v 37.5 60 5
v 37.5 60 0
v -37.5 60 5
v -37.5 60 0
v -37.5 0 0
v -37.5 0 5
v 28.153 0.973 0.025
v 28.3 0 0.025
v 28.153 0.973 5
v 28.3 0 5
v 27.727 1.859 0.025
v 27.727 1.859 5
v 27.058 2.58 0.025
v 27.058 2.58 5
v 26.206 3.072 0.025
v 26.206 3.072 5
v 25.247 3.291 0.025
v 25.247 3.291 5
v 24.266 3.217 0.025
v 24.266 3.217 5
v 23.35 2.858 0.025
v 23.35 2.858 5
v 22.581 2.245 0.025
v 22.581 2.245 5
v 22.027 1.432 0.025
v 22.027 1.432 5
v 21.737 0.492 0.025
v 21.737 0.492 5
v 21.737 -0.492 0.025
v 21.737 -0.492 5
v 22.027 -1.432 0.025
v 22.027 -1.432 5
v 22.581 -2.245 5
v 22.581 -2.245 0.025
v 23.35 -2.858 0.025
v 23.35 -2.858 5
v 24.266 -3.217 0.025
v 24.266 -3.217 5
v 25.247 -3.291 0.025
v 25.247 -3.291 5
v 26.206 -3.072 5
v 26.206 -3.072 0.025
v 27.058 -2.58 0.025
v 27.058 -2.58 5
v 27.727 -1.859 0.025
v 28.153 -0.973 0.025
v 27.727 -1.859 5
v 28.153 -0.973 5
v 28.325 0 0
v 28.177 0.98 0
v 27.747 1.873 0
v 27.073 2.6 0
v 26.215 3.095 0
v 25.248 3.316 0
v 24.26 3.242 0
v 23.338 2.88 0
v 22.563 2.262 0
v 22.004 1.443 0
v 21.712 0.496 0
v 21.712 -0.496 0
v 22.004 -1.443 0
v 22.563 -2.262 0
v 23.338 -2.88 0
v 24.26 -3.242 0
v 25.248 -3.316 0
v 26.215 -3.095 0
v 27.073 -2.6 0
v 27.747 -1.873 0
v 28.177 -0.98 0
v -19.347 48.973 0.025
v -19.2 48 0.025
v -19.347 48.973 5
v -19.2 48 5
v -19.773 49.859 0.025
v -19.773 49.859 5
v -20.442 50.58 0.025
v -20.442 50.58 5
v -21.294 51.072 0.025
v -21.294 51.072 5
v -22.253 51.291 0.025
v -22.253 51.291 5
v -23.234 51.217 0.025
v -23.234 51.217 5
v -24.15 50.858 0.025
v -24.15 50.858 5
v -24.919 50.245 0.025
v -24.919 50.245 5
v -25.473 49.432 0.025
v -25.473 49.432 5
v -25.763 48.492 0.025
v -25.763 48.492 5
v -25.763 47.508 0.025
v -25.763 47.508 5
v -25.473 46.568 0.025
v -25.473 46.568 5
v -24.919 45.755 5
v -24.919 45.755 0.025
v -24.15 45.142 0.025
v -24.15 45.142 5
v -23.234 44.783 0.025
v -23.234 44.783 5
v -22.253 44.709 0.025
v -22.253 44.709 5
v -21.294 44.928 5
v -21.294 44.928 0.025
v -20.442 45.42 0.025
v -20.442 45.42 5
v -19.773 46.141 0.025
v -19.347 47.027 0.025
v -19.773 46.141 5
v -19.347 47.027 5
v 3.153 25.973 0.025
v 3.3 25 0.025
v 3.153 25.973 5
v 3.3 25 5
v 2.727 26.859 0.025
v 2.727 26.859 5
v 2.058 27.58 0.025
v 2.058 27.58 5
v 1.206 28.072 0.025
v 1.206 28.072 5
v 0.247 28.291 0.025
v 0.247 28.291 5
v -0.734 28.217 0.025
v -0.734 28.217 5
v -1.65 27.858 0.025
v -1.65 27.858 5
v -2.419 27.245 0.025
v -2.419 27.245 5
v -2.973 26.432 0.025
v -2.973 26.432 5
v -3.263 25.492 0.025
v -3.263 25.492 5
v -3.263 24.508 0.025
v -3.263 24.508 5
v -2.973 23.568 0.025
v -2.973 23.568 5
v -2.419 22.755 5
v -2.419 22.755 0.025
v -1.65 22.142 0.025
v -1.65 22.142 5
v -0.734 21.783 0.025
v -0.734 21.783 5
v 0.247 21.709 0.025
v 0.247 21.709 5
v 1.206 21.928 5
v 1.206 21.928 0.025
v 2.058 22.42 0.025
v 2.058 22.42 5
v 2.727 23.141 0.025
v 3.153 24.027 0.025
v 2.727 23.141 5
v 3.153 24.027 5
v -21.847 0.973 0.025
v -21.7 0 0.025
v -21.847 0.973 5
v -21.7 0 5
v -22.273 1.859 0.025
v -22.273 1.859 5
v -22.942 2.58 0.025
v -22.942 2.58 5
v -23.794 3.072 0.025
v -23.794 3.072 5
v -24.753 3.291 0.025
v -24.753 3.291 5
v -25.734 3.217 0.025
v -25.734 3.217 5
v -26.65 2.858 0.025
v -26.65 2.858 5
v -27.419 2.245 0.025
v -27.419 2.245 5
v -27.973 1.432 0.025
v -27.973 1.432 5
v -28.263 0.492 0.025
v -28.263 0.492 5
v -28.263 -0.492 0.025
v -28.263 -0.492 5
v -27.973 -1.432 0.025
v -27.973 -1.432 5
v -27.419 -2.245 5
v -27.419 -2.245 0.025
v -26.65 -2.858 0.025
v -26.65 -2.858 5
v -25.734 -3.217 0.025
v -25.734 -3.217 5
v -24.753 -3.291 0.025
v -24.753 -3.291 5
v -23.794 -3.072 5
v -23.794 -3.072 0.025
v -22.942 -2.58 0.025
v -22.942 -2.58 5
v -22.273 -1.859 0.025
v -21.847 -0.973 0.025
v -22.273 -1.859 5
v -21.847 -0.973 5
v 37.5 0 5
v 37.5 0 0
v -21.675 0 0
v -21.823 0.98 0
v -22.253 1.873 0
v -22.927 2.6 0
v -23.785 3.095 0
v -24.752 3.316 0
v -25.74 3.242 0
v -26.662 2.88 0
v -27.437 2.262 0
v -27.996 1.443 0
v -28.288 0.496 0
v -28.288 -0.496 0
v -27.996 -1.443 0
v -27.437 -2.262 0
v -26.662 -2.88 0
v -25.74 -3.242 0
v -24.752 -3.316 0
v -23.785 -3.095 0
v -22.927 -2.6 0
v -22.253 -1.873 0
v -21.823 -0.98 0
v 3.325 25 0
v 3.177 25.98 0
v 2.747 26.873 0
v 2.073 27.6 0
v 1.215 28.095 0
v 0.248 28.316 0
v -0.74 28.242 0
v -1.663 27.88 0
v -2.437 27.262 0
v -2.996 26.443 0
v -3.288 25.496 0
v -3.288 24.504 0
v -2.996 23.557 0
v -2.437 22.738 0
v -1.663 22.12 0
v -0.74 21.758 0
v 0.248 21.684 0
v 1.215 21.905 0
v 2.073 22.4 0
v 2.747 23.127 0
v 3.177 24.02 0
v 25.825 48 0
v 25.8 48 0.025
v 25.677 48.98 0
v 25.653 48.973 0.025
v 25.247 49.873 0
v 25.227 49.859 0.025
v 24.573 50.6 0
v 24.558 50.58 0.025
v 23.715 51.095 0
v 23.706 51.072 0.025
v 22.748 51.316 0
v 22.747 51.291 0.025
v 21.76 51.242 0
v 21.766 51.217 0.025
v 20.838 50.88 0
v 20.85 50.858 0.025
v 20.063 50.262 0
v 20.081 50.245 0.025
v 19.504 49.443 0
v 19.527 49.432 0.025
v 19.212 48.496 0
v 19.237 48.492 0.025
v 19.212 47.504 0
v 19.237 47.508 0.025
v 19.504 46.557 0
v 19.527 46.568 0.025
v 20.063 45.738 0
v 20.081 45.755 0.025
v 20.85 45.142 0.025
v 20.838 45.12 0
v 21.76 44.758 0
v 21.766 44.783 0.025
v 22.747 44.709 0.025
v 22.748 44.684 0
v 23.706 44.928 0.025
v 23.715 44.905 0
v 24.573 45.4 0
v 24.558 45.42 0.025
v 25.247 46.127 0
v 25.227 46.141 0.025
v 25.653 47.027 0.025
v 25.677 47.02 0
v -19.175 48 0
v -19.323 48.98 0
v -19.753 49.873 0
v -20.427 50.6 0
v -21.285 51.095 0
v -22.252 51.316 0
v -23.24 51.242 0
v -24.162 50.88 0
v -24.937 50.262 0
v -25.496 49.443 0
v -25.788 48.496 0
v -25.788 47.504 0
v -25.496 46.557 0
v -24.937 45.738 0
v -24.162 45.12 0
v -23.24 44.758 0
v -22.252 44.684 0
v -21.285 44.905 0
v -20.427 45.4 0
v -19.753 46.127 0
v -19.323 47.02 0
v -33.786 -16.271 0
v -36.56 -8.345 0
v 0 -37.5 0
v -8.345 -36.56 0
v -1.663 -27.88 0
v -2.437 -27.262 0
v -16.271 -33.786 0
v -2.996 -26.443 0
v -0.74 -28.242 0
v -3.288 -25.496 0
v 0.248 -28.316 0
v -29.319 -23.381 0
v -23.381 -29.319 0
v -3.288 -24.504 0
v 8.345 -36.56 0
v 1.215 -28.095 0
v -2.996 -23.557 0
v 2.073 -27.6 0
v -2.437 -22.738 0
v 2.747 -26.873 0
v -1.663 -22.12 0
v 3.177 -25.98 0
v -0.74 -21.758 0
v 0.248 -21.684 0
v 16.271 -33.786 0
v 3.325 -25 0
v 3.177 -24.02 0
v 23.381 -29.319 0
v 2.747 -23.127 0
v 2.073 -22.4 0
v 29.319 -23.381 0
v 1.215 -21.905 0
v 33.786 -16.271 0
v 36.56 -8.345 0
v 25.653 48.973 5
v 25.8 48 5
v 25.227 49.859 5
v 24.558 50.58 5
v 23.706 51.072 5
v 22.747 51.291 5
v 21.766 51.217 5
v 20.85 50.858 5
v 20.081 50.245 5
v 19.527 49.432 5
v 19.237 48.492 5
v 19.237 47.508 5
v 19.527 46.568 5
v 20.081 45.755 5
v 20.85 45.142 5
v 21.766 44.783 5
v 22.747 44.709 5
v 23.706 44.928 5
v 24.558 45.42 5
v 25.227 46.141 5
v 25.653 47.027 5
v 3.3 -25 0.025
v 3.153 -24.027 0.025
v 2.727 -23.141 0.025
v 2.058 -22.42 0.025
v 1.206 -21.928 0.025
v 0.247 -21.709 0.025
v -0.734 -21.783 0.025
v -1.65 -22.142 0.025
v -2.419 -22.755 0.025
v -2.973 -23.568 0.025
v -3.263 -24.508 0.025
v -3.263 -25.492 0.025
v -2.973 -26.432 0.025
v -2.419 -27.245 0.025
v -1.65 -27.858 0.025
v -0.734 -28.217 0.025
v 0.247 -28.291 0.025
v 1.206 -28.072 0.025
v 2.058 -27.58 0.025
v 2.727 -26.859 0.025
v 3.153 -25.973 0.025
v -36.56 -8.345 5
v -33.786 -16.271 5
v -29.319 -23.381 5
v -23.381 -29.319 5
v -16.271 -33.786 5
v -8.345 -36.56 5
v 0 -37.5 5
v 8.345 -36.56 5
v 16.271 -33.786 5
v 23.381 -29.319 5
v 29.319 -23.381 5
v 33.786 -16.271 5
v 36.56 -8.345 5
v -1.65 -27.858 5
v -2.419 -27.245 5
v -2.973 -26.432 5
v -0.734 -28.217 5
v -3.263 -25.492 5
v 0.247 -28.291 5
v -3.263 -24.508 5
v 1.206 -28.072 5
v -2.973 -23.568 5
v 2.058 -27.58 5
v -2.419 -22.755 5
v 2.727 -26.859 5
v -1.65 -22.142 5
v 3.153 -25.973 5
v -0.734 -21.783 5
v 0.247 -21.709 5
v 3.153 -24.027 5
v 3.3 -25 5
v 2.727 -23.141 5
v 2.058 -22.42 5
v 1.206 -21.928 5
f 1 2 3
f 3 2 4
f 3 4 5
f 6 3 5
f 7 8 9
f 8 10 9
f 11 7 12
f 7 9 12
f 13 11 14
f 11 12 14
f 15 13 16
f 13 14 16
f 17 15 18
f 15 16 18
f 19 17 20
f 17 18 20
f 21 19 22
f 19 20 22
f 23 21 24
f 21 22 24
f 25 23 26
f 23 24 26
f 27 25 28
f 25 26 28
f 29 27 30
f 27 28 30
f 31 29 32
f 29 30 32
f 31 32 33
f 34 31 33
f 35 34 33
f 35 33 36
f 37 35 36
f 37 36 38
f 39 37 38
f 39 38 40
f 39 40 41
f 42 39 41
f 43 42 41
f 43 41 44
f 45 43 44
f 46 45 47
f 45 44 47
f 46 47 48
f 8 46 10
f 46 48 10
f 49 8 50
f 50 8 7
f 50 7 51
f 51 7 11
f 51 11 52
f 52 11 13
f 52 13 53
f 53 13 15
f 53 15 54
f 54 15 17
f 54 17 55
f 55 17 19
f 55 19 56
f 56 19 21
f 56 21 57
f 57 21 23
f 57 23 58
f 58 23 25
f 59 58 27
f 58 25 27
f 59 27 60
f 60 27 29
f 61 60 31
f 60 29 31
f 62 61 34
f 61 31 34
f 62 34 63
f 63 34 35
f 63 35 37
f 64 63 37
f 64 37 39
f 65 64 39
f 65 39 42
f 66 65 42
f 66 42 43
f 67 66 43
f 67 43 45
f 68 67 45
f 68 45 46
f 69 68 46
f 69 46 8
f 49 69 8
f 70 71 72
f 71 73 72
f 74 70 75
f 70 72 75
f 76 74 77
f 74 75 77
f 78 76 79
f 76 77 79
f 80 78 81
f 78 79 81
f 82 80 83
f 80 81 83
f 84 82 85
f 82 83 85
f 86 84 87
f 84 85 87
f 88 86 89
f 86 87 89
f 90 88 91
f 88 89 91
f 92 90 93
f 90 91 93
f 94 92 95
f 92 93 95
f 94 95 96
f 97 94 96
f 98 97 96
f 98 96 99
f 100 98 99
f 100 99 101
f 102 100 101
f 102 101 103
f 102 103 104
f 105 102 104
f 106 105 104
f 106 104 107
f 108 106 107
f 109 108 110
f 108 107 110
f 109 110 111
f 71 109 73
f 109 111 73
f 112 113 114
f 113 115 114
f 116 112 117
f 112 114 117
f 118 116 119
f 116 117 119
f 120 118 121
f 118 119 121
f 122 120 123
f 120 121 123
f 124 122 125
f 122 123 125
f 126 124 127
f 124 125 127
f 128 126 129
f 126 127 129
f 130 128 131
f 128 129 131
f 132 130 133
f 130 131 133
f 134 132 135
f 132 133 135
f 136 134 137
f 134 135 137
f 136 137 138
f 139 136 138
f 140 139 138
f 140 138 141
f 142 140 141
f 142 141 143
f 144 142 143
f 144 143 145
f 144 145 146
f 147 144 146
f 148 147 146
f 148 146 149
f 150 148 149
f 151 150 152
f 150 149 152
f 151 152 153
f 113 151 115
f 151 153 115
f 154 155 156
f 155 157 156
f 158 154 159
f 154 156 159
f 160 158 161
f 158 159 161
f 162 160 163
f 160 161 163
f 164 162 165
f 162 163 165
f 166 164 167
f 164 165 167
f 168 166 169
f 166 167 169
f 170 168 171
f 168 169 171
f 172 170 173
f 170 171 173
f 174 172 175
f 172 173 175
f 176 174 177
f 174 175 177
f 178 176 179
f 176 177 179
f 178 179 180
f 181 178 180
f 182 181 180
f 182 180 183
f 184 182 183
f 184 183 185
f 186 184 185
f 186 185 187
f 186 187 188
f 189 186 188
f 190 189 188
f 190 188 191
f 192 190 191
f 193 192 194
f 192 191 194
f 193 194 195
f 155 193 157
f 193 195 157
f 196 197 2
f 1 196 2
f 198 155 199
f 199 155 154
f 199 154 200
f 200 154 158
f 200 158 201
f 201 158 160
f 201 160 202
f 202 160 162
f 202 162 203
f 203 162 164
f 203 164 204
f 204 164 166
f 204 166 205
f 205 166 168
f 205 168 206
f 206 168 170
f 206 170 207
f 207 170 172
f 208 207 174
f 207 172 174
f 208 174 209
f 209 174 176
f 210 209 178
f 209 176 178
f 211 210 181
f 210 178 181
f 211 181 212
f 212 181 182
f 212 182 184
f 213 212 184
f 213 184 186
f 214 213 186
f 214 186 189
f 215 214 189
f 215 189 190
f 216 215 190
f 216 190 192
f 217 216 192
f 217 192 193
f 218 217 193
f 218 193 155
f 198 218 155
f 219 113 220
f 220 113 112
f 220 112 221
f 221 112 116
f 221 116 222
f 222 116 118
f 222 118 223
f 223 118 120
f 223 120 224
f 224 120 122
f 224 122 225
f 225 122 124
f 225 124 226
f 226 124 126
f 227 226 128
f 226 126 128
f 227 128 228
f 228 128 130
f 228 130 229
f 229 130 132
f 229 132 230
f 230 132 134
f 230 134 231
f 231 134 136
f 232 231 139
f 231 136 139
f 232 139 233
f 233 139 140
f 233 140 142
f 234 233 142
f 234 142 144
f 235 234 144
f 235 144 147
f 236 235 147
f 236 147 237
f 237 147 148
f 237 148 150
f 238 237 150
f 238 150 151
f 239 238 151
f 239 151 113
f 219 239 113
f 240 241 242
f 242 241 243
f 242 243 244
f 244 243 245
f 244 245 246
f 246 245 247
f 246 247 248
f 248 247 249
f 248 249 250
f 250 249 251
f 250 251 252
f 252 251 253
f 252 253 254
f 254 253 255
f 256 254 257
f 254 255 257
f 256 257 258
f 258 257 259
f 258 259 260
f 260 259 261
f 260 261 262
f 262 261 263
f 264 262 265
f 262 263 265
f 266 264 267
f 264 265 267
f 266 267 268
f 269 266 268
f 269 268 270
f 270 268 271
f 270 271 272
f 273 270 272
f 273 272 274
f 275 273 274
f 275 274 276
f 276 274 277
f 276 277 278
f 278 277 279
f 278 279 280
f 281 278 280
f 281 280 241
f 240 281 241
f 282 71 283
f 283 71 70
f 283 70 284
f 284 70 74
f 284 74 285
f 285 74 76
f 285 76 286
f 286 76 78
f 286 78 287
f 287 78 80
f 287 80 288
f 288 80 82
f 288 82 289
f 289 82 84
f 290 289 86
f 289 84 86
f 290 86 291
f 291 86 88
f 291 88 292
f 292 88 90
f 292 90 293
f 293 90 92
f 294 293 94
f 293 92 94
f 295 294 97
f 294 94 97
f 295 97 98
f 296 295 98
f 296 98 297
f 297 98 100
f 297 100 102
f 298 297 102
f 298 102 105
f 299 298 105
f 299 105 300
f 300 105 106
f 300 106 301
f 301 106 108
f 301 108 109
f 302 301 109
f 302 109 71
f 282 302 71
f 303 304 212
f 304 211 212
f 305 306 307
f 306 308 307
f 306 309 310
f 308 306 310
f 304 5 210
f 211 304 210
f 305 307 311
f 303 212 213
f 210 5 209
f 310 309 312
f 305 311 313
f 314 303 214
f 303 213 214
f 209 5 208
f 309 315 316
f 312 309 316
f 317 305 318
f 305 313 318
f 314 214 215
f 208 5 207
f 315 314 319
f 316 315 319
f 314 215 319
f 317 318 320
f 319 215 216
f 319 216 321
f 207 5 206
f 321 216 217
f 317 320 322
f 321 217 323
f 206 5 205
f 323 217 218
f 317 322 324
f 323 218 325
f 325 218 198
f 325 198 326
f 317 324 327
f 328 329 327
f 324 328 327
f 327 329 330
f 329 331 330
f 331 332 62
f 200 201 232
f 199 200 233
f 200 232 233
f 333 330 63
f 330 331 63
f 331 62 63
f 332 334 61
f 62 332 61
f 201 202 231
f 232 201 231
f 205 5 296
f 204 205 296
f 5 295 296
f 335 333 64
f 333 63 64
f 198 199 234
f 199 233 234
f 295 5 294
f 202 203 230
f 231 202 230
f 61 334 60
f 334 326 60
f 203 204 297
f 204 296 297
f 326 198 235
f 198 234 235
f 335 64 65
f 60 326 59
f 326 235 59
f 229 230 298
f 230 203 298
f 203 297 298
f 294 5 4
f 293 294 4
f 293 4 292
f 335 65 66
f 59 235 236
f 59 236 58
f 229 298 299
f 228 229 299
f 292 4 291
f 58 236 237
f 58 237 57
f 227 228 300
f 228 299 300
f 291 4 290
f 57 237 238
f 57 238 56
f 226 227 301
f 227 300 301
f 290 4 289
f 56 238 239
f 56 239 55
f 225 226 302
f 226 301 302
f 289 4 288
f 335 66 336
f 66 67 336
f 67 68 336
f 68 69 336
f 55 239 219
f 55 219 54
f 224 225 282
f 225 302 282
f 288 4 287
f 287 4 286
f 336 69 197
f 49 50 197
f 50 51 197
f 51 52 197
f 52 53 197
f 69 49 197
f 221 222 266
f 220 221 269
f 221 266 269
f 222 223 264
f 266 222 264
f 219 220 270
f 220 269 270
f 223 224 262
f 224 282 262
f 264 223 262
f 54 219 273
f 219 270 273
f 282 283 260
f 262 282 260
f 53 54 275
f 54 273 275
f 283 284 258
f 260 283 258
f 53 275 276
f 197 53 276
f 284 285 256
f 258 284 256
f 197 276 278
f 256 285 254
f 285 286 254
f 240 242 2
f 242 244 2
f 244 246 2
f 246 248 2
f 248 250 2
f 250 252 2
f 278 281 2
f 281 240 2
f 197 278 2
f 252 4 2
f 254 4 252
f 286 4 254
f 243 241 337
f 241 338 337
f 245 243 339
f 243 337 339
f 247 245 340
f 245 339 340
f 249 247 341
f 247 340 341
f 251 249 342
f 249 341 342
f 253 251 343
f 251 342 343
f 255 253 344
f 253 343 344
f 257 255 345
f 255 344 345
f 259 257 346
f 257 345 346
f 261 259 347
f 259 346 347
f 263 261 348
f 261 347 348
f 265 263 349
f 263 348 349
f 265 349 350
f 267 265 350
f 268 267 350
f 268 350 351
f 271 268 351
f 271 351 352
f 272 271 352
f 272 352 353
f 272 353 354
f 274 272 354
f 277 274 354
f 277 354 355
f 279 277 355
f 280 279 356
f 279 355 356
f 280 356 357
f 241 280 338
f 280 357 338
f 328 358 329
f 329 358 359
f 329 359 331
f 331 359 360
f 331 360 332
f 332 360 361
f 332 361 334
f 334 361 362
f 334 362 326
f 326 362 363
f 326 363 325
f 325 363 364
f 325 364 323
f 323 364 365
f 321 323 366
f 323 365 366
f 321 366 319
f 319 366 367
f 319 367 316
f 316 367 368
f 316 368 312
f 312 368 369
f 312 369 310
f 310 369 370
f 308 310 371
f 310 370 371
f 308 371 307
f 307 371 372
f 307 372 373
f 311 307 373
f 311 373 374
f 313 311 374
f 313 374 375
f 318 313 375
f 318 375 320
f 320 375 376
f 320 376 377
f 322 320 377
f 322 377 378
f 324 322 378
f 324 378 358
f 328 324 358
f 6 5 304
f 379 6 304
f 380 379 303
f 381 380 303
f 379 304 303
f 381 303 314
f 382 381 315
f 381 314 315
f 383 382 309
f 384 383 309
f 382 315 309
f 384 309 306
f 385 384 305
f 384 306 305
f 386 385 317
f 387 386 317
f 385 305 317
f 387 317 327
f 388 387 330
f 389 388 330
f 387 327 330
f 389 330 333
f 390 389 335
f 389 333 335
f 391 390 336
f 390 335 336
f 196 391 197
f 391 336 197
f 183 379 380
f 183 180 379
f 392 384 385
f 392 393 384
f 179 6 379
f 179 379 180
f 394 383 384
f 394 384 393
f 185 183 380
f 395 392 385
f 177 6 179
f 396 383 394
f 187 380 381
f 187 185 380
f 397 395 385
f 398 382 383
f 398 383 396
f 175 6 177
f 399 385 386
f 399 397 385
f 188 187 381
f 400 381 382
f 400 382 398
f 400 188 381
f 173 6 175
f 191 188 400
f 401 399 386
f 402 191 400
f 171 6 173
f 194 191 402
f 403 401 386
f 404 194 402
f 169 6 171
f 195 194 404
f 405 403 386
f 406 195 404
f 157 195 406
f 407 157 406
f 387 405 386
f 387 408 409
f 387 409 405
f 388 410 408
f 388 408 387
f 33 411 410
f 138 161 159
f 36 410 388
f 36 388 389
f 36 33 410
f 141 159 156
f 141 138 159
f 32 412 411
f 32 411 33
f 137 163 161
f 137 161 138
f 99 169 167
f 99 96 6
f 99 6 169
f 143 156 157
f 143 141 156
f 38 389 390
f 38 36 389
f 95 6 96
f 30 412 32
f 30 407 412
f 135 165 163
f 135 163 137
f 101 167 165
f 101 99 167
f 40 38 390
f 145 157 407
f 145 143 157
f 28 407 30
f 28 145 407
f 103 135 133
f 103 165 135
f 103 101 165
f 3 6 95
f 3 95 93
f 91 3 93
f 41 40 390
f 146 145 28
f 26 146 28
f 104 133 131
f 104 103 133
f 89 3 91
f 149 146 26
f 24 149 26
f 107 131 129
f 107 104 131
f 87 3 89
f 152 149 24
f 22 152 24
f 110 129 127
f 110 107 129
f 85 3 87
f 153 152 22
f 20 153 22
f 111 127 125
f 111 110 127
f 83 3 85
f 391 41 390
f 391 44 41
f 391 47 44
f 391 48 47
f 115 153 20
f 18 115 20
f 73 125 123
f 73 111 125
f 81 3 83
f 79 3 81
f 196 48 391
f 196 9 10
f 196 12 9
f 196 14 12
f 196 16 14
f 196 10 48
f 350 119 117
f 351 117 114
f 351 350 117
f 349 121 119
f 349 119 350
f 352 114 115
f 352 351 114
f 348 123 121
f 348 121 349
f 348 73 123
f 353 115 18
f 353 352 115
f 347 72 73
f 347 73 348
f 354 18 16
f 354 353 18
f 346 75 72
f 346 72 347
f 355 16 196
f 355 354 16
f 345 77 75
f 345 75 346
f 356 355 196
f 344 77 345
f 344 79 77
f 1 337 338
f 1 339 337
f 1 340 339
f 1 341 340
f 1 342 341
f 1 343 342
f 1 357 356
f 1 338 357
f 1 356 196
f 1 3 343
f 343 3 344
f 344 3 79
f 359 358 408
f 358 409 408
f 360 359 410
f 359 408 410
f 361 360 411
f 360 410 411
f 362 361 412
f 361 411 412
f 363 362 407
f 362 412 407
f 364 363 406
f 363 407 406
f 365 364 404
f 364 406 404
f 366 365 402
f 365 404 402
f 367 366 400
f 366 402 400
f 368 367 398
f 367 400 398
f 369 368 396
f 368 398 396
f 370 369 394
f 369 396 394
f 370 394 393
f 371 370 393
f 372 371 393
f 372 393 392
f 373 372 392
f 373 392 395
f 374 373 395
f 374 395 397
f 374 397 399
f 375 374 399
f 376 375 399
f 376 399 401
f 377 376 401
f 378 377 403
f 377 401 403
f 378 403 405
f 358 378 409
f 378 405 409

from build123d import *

# Parameters (mm, degrees)
BOSS_EXTRUDE1_DEPTH            = 5
M6_CLEARANCE_HOLE2_D           = 6.6
M6_CLEARANCE_HOLE2_CSINK_D     = 6.65
M6_CLEARANCE_HOLE2_CSINK_ANGLE = 90


with BuildPart() as part:
    # Sketch6 → Boss-Extrude1 (new body)
    with BuildSketch(Plane.XY):
        with BuildLine():
            Line((37.5, 0), (37.5, 60))
            Line((37.5, 60), (-37.5, 60))
            Line((-37.5, 60), (-37.5, 0))
            ThreePointArc((-37.5, 0), (0, -37.5), (37.5, 0))
        make_face()
    extrude(amount=BOSS_EXTRUDE1_DEPTH)

    # M6 Clearance Hole2 (through all)
    with Locations(Plane(origin=(0, 0, 0), x_dir=(-1, 0, 0), z_dir=(0, 0, -1))):
        with Locations((-22.5, 48), (22.5, 48), (0, 25), (25, 0), (0, -25), (-25, 0)):
            CounterSinkHole(M6_CLEARANCE_HOLE2_D / 2, M6_CLEARANCE_HOLE2_CSINK_D / 2, counter_sink_angle=M6_CLEARANCE_HOLE2_CSINK_ANGLE)


solid = part.part
